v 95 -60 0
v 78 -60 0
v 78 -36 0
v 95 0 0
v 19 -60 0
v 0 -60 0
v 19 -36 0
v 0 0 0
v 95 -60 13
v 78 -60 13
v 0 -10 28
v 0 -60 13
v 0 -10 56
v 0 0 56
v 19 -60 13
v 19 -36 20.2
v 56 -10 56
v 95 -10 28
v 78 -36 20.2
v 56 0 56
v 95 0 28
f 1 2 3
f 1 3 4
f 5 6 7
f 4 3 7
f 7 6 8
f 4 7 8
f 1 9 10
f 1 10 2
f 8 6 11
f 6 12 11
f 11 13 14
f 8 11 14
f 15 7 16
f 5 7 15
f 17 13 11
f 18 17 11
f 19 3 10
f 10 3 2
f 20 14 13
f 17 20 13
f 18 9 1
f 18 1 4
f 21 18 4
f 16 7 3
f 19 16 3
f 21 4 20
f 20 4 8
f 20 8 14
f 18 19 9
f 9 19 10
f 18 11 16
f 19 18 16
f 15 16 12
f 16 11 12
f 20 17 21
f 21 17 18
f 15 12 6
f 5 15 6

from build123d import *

# Parameters (mm, degrees)
F1_DEPTH   = 95
F3_DEPTH   = 10.001
F4_W       = 59
F4_H       = 24
F1_FACE2_W = 95
F1_FACE2_H = 52.2015325446
F5_DEPTH   = 56.001


with BuildPart() as f1:
    # F0 (on Right) → F1 (new body)
    with BuildSketch(Plane.YZ):
        Polygon((-60, 0), (0, 0), (0, 56), (-10, 56), (-10, 28), (-60, 13), align=None)
    extrude(amount=F1_DEPTH)

    # F2 (on face) → F3 (cut, through all)
    with BuildSketch(Plane.XZ.offset(10)):
        Polygon((95, 56), (56, 56), (95, 28), align=None)
    extrude(amount=-F3_DEPTH, mode=Mode.SUBTRACT)

    # F4 (on face) + F1_face2 (on face) → F5 (cut, through all)
    with BuildSketch(Plane(origin=(0, 0, 0), x_dir=(1, 0, 0), z_dir=(0, 0, -1))):
        with Locations((48.5, 48)):
            Rectangle(F4_W, F4_H)
    with BuildSketch(Plane(origin=(47.5, -35, 20.5), x_dir=(1, 0, 0), z_dir=(0, -0.2873478856, 0.9578262852))):
        Rectangle(F1_FACE2_W, F1_FACE2_H)
    extrude(amount=-F5_DEPTH, dir=(0, 0, -1), mode=Mode.SUBTRACT)


solid = f1.part
